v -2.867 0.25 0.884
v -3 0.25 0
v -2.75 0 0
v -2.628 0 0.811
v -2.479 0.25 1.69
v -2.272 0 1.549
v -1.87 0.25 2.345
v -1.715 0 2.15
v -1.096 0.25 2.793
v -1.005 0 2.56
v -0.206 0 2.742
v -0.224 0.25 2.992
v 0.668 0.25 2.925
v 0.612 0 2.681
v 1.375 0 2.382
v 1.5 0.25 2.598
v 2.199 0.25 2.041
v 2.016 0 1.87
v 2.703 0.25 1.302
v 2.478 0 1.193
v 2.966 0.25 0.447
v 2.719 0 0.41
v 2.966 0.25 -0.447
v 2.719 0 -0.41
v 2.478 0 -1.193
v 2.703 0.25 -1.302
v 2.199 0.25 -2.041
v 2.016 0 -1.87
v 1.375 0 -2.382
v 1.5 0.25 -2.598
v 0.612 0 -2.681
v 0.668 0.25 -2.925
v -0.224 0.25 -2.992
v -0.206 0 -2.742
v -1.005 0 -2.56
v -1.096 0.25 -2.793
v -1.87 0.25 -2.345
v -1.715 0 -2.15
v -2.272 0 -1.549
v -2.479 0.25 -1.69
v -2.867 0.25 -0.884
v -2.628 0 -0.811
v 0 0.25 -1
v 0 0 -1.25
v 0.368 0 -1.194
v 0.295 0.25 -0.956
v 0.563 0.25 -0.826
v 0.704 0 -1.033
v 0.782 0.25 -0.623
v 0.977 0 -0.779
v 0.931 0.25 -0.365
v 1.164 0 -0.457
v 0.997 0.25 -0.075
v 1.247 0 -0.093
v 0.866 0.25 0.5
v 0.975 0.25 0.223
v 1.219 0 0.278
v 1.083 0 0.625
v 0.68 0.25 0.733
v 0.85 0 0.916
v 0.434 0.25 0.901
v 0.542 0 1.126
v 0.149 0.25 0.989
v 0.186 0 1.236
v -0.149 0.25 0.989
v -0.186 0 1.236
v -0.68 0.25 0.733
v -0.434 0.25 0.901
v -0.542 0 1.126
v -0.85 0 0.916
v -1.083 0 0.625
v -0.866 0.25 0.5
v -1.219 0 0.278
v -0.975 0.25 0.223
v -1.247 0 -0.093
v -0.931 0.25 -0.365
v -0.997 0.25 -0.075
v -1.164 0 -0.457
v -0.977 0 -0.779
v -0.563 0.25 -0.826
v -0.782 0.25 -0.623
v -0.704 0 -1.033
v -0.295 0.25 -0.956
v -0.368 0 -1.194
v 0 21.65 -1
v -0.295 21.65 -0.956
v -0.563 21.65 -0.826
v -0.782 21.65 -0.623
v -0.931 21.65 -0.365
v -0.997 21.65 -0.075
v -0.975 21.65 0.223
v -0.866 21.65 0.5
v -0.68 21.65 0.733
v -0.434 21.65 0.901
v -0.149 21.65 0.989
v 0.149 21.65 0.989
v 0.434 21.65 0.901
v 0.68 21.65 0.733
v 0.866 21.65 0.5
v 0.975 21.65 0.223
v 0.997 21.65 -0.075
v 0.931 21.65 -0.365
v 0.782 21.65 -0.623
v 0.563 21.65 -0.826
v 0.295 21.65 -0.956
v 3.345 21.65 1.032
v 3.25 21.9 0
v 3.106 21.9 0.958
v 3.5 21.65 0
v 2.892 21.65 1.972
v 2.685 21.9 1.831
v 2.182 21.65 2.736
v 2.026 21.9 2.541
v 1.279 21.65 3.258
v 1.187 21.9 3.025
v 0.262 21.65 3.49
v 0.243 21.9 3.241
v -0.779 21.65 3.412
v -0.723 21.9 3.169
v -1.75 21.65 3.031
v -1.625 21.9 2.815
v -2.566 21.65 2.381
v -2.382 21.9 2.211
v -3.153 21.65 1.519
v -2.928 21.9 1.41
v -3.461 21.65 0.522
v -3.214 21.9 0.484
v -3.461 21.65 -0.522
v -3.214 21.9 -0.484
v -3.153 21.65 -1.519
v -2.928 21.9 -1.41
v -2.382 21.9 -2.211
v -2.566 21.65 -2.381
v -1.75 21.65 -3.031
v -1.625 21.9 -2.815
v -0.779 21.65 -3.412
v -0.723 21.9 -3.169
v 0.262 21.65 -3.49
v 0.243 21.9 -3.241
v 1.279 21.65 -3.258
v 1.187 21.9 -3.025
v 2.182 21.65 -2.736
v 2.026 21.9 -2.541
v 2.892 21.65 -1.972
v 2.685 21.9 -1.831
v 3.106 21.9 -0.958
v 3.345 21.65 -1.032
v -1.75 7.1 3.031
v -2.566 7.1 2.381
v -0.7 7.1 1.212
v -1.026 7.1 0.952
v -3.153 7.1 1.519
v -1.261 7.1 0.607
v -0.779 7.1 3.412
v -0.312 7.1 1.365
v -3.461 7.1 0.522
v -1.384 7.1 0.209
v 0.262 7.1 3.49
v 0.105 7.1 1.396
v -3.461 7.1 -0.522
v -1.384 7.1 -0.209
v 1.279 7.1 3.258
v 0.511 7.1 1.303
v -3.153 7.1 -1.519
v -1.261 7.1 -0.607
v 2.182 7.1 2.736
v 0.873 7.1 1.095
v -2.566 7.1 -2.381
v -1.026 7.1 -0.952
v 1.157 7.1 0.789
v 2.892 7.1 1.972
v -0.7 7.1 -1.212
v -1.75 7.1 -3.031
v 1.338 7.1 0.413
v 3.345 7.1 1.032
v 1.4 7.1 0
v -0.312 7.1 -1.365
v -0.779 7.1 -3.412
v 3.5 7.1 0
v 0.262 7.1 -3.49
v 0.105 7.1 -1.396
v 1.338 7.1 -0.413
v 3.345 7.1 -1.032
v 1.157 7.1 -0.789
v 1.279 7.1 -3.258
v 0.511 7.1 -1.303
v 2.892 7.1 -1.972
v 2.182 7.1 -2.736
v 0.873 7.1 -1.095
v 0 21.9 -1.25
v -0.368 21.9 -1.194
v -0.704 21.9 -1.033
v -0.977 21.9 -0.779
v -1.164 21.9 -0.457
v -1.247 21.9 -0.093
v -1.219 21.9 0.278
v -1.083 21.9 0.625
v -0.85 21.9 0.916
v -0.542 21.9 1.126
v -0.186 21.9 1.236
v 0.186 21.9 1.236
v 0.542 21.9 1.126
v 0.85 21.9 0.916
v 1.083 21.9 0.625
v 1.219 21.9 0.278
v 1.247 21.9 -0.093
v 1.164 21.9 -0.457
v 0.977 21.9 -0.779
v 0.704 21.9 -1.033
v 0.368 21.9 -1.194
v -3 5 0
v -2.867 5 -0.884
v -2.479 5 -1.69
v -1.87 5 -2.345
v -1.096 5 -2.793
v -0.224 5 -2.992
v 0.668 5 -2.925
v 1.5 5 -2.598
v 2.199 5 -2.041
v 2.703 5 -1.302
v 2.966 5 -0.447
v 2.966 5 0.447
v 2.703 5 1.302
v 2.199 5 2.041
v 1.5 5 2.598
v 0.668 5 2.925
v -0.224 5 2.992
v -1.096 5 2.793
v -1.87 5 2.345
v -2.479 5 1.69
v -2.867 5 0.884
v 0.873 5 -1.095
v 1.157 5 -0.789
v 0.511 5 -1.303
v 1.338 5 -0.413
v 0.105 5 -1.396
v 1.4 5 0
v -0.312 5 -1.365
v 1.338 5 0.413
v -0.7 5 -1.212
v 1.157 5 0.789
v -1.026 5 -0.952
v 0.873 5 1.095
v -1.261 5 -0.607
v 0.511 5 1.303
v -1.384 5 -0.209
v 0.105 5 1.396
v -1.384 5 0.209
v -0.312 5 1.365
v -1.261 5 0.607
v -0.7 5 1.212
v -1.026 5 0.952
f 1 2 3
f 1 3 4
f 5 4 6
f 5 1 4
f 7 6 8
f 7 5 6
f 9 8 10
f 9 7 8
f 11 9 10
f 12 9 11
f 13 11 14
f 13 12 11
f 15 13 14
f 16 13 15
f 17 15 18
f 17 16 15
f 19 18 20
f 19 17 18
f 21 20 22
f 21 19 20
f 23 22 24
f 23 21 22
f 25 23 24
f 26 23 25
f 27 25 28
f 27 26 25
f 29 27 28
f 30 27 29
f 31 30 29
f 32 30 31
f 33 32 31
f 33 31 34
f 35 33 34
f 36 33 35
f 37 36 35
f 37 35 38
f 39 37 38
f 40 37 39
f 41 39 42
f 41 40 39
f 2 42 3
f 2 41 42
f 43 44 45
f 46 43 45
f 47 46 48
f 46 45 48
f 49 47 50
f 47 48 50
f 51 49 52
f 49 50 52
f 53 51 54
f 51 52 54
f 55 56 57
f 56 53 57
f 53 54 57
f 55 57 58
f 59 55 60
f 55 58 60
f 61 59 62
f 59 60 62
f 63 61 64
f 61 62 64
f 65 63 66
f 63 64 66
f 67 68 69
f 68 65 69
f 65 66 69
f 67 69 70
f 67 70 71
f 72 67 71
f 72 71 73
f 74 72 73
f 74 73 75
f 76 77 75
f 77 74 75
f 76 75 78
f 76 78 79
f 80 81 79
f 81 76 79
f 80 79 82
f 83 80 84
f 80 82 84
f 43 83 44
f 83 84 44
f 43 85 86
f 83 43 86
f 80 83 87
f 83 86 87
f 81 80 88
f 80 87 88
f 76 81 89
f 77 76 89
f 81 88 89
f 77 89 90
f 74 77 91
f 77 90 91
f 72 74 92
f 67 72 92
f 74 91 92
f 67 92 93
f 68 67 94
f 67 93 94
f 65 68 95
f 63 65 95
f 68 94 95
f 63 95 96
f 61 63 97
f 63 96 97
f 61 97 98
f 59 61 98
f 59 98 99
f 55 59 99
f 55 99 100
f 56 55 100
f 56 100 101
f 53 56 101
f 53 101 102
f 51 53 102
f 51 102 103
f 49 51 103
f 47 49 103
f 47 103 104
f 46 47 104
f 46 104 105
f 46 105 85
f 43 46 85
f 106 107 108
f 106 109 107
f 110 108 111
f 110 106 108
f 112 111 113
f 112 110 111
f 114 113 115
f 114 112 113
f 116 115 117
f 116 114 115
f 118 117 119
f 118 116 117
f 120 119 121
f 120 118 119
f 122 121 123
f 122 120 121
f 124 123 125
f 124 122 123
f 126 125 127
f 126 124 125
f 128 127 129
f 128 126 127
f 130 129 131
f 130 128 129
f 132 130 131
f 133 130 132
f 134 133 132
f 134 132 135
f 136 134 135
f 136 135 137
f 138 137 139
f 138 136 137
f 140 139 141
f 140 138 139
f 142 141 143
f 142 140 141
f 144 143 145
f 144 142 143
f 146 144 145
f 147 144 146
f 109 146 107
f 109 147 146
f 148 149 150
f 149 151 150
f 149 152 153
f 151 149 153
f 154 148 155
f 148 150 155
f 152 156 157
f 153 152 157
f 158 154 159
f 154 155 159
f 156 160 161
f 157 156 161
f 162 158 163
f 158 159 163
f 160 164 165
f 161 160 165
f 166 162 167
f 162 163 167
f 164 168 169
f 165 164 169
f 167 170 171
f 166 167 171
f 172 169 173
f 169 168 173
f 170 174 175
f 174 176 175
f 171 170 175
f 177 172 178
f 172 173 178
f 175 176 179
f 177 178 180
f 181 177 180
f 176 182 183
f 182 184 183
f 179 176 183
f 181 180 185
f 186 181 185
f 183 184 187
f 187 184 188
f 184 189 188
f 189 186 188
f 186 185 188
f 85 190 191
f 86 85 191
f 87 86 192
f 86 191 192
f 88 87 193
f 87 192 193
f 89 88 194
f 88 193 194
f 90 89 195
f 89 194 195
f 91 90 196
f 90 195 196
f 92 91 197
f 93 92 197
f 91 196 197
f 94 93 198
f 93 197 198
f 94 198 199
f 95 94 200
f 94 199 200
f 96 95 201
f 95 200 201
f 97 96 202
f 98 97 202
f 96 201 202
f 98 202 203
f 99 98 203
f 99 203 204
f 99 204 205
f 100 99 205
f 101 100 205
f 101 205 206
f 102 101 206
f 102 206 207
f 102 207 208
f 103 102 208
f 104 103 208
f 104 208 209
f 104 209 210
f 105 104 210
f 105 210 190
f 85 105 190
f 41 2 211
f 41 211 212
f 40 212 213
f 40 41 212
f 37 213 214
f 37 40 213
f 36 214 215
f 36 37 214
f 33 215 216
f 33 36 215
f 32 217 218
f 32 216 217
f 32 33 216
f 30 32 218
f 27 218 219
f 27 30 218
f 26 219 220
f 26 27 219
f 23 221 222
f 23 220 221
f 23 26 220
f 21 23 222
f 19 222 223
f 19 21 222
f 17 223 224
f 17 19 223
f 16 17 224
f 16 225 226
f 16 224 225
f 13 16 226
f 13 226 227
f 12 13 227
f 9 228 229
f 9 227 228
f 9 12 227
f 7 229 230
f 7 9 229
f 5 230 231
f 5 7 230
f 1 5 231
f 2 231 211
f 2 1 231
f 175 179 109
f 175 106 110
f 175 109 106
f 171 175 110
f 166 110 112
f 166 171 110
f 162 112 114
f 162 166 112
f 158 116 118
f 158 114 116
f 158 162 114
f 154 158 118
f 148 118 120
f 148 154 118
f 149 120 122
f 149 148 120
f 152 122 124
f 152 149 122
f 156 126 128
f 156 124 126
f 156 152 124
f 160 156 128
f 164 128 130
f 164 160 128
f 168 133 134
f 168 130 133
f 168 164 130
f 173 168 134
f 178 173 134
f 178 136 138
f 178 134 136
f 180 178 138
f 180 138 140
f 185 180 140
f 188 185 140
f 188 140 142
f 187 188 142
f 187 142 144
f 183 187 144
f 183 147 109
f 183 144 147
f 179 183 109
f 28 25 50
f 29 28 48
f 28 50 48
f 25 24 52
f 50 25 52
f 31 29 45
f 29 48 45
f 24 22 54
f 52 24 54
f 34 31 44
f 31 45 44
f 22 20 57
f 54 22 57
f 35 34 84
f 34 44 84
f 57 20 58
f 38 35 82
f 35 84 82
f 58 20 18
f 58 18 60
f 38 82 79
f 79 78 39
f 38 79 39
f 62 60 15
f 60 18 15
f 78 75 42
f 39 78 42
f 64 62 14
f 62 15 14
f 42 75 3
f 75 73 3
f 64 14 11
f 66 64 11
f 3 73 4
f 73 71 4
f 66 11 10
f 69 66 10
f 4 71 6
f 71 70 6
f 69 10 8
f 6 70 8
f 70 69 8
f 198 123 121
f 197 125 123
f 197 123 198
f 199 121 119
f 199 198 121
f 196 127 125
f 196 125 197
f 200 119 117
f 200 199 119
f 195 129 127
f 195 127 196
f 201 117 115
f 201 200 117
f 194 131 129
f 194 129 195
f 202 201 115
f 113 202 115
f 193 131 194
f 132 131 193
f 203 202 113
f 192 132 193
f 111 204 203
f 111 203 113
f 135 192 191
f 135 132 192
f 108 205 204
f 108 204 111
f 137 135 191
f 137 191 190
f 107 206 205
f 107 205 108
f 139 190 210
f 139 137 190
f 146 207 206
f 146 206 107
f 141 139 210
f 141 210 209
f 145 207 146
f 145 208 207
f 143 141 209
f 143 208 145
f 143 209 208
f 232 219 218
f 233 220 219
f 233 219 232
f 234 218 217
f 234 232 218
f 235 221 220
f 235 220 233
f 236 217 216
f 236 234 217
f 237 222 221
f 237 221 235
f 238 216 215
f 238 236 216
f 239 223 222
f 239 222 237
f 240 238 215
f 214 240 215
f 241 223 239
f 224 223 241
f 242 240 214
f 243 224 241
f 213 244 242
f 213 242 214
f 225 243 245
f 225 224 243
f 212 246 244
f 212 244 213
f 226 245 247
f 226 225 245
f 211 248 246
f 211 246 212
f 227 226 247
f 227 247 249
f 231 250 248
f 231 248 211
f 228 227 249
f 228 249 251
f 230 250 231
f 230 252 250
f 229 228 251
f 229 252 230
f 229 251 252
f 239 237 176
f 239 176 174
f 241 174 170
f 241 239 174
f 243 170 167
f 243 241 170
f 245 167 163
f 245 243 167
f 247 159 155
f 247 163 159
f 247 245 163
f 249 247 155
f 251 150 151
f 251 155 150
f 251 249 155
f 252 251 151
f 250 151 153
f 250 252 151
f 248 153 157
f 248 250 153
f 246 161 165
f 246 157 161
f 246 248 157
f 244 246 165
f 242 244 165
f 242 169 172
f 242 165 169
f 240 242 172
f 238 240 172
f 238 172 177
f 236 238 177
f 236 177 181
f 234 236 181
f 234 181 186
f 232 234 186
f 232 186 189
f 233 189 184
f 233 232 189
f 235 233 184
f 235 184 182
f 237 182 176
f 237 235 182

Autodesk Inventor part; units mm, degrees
ref_plane "YZ Plane" through (0, 0, 0) normal (1, 0, 0) x (0, 1, 0)
ref_plane "XZ Plane" through (0, 0, 0) normal (0, 1, 0) x (-1, 0, 0)
ref_plane "XY Plane" through (0, 0, 0) normal (0, 0, 1) x (1, 0, 0)
sketch "草圖1" plane through (0, 0, 0) normal (0, 1, 0) x (-1, 0, 0)
  circle A0 centre (0, 0) radius 3
  dimension "d0" = 6
extrude "擠出1" add sketch "草圖1" along normal blind 5
sketch "草圖2" plane through (0, 5, 0) normal (0, 1, 0) x (1, 0, 0)
  circle A0 centre (0, 0) radius 3 projected
  circle A1 centre (0, 0) radius 1.4
  dimension "d4" = 2.8
extrude "擠出2" add sketch "草圖2" along normal blind 2.1 contours A1
sketch "草圖3" plane through (0, 7.1, 0) normal (0, 1, 0) x (1, 0, 0)
  circle A0 centre (0, 0) radius 1.4 projected
  circle A1 centre (0, 0) radius 3.5
  dimension "d8" = 7
extrude "擠出3" add sketch "草圖3" along normal blind 14.8 contours A0 | A1
sketch "草圖5" plane through (0, 0, 0) normal (0, -1, 0) x (1, 0, 0)
  circle A0 centre (0, 0) radius 3 projected
hole "孔1" at (0, 0, 0) direction (0, 1, 0) diameter 2 end through all
chamfer "倒角2" distance 0.25 angle 45 4 edges at (3, 0, 0) (0, 0, 1) (-3.5, 21.9, 0) (0, 21.9, 1)
thread "螺紋1" size "M6x1" class "6g" standard "ANSI Metric M Profile" full length
thread "螺紋2" size "M7x1" class "6g" standard "ANSI Metric M Profile" full length
properties part number "e3d_v6_heat_break"
